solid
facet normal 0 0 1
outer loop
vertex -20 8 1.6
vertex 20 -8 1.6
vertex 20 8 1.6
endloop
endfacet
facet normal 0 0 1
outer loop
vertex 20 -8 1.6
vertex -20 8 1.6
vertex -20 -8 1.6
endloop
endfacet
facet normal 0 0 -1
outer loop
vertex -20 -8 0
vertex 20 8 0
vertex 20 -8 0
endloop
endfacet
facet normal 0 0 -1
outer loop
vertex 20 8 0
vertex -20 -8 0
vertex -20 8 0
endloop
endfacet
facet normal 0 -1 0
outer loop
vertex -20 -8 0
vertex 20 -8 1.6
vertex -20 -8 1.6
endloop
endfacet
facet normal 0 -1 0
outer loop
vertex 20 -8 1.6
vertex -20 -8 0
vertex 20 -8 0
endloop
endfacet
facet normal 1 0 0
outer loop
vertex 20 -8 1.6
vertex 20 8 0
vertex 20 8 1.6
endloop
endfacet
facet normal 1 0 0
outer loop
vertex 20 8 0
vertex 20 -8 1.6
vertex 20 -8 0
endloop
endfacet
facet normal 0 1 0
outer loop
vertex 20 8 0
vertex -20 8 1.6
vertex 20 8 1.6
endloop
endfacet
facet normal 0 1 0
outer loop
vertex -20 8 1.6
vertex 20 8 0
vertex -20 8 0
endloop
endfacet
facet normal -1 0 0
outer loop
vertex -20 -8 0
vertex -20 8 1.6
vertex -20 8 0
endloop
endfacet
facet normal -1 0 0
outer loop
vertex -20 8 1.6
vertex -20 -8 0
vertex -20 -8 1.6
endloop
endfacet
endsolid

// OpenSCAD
$fn = 64;

pcb_length = 40.0;
pcb_width  = 16.0;
pcb_thick  = 1.6;

color([0.05, 0.45, 0.18])
translate([-pcb_length/2, -pcb_width/2, 0])
cube([pcb_length, pcb_width, pcb_thick], center=false);
